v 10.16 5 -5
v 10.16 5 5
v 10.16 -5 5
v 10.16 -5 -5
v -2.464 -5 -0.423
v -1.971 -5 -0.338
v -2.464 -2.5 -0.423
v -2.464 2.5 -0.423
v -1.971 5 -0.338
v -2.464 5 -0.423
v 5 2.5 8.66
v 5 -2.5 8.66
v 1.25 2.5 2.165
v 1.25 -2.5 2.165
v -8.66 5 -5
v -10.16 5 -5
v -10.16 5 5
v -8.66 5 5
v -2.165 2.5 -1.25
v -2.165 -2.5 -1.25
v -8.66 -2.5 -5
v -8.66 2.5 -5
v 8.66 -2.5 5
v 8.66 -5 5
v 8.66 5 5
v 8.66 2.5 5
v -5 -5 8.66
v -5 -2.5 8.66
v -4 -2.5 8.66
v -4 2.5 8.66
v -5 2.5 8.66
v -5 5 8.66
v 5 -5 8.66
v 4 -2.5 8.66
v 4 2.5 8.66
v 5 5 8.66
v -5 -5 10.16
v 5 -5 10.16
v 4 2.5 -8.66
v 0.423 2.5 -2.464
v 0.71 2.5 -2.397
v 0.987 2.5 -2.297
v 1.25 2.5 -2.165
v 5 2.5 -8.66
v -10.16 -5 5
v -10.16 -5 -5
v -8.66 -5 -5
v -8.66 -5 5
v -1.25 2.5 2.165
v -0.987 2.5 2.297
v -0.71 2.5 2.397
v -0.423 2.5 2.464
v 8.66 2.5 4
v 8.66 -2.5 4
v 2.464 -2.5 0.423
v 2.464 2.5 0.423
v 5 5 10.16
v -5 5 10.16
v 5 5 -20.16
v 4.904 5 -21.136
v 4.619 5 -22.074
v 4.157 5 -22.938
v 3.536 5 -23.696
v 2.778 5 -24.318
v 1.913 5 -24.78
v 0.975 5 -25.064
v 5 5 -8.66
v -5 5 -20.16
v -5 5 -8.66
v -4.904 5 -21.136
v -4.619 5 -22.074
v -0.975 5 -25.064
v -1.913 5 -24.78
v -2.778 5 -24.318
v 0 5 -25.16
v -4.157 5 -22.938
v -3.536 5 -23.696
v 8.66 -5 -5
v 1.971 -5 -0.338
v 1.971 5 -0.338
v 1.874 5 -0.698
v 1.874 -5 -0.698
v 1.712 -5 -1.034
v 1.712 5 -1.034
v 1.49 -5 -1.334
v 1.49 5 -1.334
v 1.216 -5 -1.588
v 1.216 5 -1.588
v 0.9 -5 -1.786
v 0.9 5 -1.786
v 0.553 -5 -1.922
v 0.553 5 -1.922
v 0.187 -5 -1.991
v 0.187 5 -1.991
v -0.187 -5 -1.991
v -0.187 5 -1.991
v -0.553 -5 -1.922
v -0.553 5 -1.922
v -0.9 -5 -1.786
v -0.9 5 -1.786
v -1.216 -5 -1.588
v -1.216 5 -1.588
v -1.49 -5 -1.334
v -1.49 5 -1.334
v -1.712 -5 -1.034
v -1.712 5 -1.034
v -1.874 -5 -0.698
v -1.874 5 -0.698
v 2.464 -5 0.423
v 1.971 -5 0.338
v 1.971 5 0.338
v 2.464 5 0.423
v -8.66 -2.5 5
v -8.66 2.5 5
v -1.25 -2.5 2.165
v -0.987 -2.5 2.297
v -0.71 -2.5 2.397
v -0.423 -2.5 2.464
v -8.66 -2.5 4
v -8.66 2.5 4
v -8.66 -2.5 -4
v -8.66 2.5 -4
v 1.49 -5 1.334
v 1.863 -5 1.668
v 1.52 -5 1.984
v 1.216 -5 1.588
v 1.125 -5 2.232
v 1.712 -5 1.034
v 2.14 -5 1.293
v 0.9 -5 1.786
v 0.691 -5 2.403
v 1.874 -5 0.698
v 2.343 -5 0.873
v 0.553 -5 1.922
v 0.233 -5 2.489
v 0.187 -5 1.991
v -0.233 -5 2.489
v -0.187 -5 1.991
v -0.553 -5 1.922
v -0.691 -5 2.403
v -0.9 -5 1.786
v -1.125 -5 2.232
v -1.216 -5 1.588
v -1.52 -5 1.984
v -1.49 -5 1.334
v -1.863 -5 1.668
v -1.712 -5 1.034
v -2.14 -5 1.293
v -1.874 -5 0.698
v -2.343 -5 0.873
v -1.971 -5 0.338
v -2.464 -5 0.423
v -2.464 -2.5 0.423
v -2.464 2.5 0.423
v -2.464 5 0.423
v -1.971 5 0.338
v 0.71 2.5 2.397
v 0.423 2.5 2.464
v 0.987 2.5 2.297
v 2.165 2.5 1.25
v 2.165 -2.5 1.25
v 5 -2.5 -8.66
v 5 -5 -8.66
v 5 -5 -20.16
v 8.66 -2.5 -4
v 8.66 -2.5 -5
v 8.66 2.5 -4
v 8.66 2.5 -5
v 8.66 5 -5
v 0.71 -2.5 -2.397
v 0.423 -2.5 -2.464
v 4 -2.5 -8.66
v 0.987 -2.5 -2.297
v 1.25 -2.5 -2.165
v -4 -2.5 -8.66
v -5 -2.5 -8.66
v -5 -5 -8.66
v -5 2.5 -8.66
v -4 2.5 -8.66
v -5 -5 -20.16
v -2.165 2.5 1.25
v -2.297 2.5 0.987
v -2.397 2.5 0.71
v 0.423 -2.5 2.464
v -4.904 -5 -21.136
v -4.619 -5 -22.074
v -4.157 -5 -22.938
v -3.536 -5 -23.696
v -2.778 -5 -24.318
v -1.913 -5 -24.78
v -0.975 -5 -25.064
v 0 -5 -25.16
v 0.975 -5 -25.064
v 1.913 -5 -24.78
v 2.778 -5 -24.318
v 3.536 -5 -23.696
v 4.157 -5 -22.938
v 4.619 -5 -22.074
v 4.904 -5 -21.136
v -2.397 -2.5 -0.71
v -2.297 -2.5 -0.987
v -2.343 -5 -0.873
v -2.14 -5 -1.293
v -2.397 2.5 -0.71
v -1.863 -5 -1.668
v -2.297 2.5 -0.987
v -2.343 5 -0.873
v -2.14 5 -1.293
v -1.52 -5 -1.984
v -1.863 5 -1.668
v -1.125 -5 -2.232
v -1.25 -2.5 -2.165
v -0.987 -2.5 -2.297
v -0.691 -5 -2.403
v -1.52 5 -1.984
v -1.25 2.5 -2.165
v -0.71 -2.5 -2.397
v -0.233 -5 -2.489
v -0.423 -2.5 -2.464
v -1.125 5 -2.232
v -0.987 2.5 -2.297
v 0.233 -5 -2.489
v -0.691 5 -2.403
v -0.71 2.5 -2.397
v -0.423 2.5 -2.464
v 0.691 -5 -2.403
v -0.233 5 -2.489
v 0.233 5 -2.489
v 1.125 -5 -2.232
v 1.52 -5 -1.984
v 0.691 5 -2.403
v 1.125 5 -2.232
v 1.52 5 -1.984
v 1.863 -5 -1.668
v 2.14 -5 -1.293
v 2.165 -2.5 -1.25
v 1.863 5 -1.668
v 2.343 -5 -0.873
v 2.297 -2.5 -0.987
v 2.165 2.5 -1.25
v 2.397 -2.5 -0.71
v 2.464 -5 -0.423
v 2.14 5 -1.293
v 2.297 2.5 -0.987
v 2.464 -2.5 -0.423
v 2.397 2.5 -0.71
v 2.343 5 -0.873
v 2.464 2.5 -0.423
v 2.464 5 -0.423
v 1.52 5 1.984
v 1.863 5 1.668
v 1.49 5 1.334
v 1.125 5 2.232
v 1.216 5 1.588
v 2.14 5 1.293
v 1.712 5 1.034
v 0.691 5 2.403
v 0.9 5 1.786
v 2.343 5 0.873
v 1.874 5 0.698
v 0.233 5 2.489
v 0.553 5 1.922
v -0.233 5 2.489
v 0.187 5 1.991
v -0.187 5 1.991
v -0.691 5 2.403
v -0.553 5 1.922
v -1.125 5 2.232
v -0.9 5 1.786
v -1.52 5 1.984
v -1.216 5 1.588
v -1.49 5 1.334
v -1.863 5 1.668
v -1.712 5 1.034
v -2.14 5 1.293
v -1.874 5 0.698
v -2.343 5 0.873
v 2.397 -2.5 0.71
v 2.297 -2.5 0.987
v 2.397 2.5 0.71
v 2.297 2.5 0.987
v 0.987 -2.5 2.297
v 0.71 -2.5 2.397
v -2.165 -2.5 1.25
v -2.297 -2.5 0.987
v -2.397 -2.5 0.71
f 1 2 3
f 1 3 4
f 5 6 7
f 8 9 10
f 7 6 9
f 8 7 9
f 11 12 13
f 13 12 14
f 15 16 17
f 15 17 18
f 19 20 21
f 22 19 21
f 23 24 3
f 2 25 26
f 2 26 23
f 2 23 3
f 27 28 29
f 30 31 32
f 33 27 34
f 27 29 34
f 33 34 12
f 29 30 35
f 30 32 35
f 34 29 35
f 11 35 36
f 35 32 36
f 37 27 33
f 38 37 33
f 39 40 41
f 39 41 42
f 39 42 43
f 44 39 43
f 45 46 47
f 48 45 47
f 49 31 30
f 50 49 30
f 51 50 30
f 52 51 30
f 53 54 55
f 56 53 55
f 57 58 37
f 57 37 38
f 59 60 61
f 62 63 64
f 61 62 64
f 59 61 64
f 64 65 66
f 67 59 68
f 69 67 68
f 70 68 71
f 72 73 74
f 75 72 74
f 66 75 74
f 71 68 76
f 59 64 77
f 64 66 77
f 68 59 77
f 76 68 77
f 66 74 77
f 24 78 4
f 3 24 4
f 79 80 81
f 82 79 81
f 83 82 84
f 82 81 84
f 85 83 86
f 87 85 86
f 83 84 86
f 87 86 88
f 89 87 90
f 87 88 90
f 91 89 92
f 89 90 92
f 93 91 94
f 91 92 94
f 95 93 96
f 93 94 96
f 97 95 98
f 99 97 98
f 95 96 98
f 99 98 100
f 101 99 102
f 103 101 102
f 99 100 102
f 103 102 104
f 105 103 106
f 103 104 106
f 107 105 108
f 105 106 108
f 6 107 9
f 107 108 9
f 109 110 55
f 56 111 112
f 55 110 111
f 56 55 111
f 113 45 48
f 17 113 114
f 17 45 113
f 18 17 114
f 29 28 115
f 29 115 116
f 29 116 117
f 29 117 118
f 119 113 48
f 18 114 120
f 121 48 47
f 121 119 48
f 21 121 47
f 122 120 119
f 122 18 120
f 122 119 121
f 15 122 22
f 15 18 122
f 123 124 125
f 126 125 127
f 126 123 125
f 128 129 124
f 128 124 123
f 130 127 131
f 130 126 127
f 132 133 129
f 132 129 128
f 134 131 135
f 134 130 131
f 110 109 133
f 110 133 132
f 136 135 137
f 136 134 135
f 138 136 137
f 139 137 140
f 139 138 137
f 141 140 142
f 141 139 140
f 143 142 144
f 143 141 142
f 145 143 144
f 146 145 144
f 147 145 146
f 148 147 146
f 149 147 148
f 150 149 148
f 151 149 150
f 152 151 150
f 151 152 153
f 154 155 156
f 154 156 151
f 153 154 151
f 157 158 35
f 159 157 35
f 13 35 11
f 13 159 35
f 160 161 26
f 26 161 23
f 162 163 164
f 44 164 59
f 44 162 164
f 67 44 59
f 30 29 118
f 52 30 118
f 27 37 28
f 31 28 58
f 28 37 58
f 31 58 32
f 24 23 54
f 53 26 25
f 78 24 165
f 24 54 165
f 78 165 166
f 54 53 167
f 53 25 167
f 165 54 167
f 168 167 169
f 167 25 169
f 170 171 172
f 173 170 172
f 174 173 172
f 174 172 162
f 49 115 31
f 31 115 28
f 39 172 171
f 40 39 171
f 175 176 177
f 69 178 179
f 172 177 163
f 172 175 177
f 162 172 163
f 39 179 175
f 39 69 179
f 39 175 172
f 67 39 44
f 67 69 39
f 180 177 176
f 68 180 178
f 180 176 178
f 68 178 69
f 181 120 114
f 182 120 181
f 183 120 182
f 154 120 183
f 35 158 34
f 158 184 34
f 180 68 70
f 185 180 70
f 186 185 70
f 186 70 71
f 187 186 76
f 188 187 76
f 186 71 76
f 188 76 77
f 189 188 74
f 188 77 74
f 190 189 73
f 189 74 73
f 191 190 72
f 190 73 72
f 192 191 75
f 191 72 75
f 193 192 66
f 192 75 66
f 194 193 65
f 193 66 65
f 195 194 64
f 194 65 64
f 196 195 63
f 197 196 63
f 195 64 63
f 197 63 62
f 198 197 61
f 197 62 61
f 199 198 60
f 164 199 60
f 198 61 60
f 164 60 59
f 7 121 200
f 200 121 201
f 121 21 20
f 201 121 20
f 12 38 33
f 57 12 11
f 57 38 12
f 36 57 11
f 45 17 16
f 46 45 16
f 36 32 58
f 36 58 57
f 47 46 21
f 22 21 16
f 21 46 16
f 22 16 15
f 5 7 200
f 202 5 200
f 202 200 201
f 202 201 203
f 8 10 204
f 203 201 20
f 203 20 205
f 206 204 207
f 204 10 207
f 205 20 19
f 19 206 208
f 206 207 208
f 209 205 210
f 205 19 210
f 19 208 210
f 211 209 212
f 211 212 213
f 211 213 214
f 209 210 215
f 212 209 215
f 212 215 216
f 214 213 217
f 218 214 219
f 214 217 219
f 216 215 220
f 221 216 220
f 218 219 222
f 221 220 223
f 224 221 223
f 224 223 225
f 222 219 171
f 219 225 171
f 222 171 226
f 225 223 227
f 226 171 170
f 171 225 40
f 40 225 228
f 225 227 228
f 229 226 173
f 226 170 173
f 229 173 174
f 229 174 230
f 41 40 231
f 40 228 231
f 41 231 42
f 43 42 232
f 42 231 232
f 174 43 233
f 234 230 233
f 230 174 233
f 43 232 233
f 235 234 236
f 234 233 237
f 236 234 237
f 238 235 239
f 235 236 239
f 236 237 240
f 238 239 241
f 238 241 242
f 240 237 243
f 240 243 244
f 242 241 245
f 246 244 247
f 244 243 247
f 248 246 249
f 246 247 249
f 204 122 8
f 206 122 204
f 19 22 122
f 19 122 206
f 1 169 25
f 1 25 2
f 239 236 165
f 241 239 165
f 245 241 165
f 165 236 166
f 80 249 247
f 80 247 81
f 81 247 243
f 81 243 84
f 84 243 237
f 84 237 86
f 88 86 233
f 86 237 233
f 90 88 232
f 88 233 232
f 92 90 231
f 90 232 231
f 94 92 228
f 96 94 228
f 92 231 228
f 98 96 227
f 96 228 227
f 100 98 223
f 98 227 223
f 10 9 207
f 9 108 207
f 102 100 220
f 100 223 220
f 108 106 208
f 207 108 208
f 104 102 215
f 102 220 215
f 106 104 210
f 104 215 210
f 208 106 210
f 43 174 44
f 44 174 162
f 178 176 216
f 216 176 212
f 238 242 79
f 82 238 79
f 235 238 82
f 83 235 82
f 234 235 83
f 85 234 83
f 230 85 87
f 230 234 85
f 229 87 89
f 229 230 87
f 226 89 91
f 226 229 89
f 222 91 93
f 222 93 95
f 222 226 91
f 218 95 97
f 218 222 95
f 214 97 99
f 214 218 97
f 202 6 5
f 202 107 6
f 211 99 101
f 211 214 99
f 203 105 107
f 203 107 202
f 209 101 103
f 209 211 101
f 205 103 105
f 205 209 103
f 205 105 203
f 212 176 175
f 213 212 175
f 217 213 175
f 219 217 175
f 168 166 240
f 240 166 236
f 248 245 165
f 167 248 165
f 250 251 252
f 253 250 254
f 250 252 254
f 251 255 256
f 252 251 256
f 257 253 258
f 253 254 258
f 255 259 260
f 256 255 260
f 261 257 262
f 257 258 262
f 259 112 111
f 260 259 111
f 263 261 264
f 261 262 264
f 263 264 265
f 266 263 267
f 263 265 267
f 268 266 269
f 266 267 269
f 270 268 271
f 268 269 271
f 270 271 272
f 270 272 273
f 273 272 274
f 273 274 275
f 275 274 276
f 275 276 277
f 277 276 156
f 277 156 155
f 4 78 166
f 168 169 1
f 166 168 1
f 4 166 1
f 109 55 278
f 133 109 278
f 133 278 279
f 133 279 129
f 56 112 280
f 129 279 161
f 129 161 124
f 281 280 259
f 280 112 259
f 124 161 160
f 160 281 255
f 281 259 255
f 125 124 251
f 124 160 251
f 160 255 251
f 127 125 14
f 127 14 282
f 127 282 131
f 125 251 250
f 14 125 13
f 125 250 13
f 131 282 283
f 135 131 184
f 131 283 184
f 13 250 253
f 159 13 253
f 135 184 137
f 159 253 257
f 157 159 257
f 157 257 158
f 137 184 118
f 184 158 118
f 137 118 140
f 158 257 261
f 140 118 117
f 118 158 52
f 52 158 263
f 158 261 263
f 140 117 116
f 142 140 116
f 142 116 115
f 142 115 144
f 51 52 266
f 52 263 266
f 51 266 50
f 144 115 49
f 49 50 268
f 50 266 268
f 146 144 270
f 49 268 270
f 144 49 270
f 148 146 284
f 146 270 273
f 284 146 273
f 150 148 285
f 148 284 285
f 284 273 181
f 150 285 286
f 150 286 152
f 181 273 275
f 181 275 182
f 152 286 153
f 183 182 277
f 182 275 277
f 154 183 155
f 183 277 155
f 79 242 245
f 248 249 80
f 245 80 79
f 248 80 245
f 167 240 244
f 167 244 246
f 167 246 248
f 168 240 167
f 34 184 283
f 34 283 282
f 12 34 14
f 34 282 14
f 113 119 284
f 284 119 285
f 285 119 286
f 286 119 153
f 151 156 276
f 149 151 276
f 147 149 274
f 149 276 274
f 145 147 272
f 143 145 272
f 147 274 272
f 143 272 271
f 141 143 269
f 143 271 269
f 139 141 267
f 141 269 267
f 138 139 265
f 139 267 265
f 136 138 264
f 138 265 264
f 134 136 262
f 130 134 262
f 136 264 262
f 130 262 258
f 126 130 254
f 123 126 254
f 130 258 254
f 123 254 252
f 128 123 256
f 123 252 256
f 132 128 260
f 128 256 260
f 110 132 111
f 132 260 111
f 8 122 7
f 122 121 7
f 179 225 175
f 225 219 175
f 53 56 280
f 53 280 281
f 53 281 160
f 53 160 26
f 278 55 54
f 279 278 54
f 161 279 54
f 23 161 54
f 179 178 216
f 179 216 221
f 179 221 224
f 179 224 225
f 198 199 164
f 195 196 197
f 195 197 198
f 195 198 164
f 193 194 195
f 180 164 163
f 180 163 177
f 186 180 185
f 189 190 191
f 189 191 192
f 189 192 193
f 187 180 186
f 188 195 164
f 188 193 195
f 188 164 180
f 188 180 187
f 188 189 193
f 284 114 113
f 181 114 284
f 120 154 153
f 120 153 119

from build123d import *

# Parameters (mm, degrees)
SKETCH1_W                     = 10
SKETCH1_H                     = 1.5
BASE_BUTTERFLY_BLOCKS_DEPTH   = 5
SKETCH1_W_2                   = 1.5
SKETCH1_H_2                   = 10
BASE_BUTTERFLY_BLOCKS_2_DEPTH = 5
BASE_BUTTERFLY_BLOCKS_3_DEPTH = 5
BASE_BUTTERFLY_BLOCKS_4_DEPTH = 5
BASE_BUTTERFLY_BLOCKS_5_DEPTH = 5
BASE_BUTTERFLY_BLOCKS_6_DEPTH = 5
BASE_BUTTERFLY_FLEXURES_DEPTH = 2.5
SKETCH3_W                     = 10
SKETCH3_H                     = 10
BOSS_EXTRUDE4_DEPTH           = 10
BOSS_EXTRUDE5_DEPTH           = 10


with BuildPart() as part:
    # Sketch1 → base_butterfly_blocks (new, symmetric)
    with BuildSketch(Plane(origin=(0, 0, 0), x_dir=(1, 0, 0), z_dir=(0, 1, 0))):
        with Locations((0, -9.410254038)):
            Rectangle(SKETCH1_W, SKETCH1_H)
    extrude(amount=BASE_BUTTERFLY_BLOCKS_DEPTH, both=True)



with BuildPart() as body_2:
    # Sketch1 → base_butterfly_blocks 2 (new, symmetric)
    with BuildSketch(Plane(origin=(0, 0, 0), x_dir=(1, 0, 0), z_dir=(0, 1, 0))):
        with Locations((-9.410254038, 0)):
            Rectangle(SKETCH1_W_2, SKETCH1_H_2)
    extrude(amount=BASE_BUTTERFLY_BLOCKS_2_DEPTH, both=True)


with BuildPart() as body_3:
    # Sketch1 → base_butterfly_blocks 3 (new, symmetric)
    with BuildSketch(Plane(origin=(0, 0, 0), x_dir=(1, 0, 0), z_dir=(0, 1, 0))):
        with Locations((0, 9.410254038)):
            Rectangle(SKETCH1_W, SKETCH1_H)
    extrude(amount=BASE_BUTTERFLY_BLOCKS_3_DEPTH, both=True)


with BuildPart() as body_4:
    # Sketch1 → base_butterfly_blocks 4 (new, symmetric)
    with BuildSketch(Plane(origin=(0, 0, 0), x_dir=(1, 0, 0), z_dir=(0, 1, 0))):
        with Locations((9.410254038, 0)):
            Rectangle(SKETCH1_W_2, SKETCH1_H_2)
    extrude(amount=BASE_BUTTERFLY_BLOCKS_4_DEPTH, both=True)


with BuildPart() as body_5:
    # Sketch1 → base_butterfly_blocks 5 (new, symmetric)
    with BuildSketch(Plane(origin=(0, 0, 0), x_dir=(1, 0, 0), z_dir=(0, 1, 0))):
        with BuildLine():
            Line((-1.971217842, 0.338083152), (-2.464022303, 0.42260394))
            ThreePointArc((-2.464022303, 0.42260394), (0, 2.5), (2.464022303, 0.42260394))
            Line((2.464022303, 0.42260394), (1.971217842, 0.338083152))
            ThreePointArc((1.971217842, 0.338083152), (0, 2), (-1.971217842, 0.338083152))
        make_face()
    extrude(amount=BASE_BUTTERFLY_BLOCKS_5_DEPTH, both=True)


with BuildPart() as body_6:
    # Sketch1 → base_butterfly_blocks 6 (new, symmetric)
    with BuildSketch(Plane(origin=(0, 0, 0), x_dir=(1, 0, 0), z_dir=(0, 1, 0))):
        with BuildLine():
            ThreePointArc((-1.971217842, -0.338083152), (0, -2), (1.971217842, -0.338083152))
            Line((1.971217842, -0.338083152), (2.464022303, -0.42260394))
            ThreePointArc((2.464022303, -0.42260394), (0, -2.5), (-2.464022303, -0.42260394))
            Line((-2.464022303, -0.42260394), (-1.971217842, -0.338083152))
        make_face()
    extrude(amount=BASE_BUTTERFLY_BLOCKS_6_DEPTH, both=True)


with BuildPart() as part_1:
    add(part.part)

    add(body_2.part)  # base_butterfly_flexures merges body 2

    add(body_3.part)  # base_butterfly_flexures merges body 3

    add(body_4.part)  # base_butterfly_flexures merges body 4

    add(body_5.part)  # base_butterfly_flexures merges body 5

    add(body_6.part)  # base_butterfly_flexures merges body 6
    # Sketch1<4> → base_butterfly_flexures (add, symmetric)
    with BuildSketch(Plane(origin=(0, 0, 0), x_dir=(1, 0, 0), z_dir=(0, 1, 0))):
        with BuildLine():
            Line((-8.660254038, 5), (-8.660254038, 4))
            Line((-8.660254038, 4), (-2.464022303, 0.42260394))
            ThreePointArc((-2.464022303, 0.42260394), (-2.351224133, 0.84955581), (-2.165063509, 1.25))
            Line((-2.165063509, 1.25), (-8.660254038, 5))
        make_face()
        with BuildLine():
            Line((-5, 8.660254038), (-1.25, 2.165063509))
            ThreePointArc((-1.25, 2.165063509), (-0.84955581, 2.351224133), (-0.42260394, 2.464022303))
            Line((-0.42260394, 2.464022303), (-4, 8.660254038))
            Line((-4, 8.660254038), (-5, 8.660254038))
        make_face()
        with BuildLine():
            Line((4, 8.660254038), (0.42260394, 2.464022303))
            ThreePointArc((0.42260394, 2.464022303), (0.84955581, 2.351224133), (1.25, 2.165063509))
            Line((1.25, 2.165063509), (5, 8.660254038))
            Line((5, 8.660254038), (4, 8.660254038))
        make_face()
        with BuildLine():
            Line((2.464022303, 0.42260394), (8.660254038, 4))
            Line((8.660254038, 4), (8.660254038, 5))
            Line((8.660254038, 5), (2.165063509, 1.25))
            ThreePointArc((2.165063509, 1.25), (2.351224133, 0.84955581), (2.464022303, 0.42260394))
        make_face()
        with BuildLine():
            ThreePointArc((2.464022303, -0.42260394), (2.351224133, -0.84955581), (2.165063509, -1.25))
            Line((2.165063509, -1.25), (8.660254038, -5))
            Line((8.660254038, -5), (8.660254038, -4))
            Line((8.660254038, -4), (2.464022303, -0.42260394))
        make_face()
        with BuildLine():
            ThreePointArc((1.25, -2.165063509), (0.84955581, -2.351224133), (0.42260394, -2.464022303))
            Line((0.42260394, -2.464022303), (4, -8.660254038))
            Line((4, -8.660254038), (5, -8.660254038))
            Line((5, -8.660254038), (1.25, -2.165063509))
        make_face()
        with BuildLine():
            ThreePointArc((-0.42260394, -2.464022303), (-0.84955581, -2.351224133), (-1.25, -2.165063509))
            Line((-1.25, -2.165063509), (-5, -8.660254038))
            Line((-5, -8.660254038), (-4, -8.660254038))
            Line((-4, -8.660254038), (-0.42260394, -2.464022303))
        make_face()
        with BuildLine():
            Line((-8.660254038, -5), (-2.165063509, -1.25))
            ThreePointArc((-2.165063509, -1.25), (-2.351224133, -0.84955581), (-2.464022303, -0.42260394))
            Line((-2.464022303, -0.42260394), (-8.660254038, -4))
            Line((-8.660254038, -4), (-8.660254038, -5))
        make_face()
    extrude(amount=BASE_BUTTERFLY_FLEXURES_DEPTH, both=True)

    # Sketch3 → Boss-Extrude4 (add)
    with BuildSketch(Plane(origin=(0, 0, -10.160254038), x_dir=(-1, 0, 0), z_dir=(0, 0, -1))):
        Rectangle(SKETCH3_W, SKETCH3_H)
    extrude(amount=BOSS_EXTRUDE4_DEPTH)

    # Sketch4 → Boss-Extrude5 (add)
    with BuildSketch(Plane(origin=(0, 5, 0), x_dir=(1, 0, 0), z_dir=(0, 1, 0))):
        with BuildLine():
            ThreePointArc((-5, 20.160254038), (0, 25.160254038), (5, 20.160254038))
            Line((5, 20.160254038), (-5, 20.160254038))
        make_face()
    extrude(amount=-BOSS_EXTRUDE5_DEPTH)


solid = part_1.part
